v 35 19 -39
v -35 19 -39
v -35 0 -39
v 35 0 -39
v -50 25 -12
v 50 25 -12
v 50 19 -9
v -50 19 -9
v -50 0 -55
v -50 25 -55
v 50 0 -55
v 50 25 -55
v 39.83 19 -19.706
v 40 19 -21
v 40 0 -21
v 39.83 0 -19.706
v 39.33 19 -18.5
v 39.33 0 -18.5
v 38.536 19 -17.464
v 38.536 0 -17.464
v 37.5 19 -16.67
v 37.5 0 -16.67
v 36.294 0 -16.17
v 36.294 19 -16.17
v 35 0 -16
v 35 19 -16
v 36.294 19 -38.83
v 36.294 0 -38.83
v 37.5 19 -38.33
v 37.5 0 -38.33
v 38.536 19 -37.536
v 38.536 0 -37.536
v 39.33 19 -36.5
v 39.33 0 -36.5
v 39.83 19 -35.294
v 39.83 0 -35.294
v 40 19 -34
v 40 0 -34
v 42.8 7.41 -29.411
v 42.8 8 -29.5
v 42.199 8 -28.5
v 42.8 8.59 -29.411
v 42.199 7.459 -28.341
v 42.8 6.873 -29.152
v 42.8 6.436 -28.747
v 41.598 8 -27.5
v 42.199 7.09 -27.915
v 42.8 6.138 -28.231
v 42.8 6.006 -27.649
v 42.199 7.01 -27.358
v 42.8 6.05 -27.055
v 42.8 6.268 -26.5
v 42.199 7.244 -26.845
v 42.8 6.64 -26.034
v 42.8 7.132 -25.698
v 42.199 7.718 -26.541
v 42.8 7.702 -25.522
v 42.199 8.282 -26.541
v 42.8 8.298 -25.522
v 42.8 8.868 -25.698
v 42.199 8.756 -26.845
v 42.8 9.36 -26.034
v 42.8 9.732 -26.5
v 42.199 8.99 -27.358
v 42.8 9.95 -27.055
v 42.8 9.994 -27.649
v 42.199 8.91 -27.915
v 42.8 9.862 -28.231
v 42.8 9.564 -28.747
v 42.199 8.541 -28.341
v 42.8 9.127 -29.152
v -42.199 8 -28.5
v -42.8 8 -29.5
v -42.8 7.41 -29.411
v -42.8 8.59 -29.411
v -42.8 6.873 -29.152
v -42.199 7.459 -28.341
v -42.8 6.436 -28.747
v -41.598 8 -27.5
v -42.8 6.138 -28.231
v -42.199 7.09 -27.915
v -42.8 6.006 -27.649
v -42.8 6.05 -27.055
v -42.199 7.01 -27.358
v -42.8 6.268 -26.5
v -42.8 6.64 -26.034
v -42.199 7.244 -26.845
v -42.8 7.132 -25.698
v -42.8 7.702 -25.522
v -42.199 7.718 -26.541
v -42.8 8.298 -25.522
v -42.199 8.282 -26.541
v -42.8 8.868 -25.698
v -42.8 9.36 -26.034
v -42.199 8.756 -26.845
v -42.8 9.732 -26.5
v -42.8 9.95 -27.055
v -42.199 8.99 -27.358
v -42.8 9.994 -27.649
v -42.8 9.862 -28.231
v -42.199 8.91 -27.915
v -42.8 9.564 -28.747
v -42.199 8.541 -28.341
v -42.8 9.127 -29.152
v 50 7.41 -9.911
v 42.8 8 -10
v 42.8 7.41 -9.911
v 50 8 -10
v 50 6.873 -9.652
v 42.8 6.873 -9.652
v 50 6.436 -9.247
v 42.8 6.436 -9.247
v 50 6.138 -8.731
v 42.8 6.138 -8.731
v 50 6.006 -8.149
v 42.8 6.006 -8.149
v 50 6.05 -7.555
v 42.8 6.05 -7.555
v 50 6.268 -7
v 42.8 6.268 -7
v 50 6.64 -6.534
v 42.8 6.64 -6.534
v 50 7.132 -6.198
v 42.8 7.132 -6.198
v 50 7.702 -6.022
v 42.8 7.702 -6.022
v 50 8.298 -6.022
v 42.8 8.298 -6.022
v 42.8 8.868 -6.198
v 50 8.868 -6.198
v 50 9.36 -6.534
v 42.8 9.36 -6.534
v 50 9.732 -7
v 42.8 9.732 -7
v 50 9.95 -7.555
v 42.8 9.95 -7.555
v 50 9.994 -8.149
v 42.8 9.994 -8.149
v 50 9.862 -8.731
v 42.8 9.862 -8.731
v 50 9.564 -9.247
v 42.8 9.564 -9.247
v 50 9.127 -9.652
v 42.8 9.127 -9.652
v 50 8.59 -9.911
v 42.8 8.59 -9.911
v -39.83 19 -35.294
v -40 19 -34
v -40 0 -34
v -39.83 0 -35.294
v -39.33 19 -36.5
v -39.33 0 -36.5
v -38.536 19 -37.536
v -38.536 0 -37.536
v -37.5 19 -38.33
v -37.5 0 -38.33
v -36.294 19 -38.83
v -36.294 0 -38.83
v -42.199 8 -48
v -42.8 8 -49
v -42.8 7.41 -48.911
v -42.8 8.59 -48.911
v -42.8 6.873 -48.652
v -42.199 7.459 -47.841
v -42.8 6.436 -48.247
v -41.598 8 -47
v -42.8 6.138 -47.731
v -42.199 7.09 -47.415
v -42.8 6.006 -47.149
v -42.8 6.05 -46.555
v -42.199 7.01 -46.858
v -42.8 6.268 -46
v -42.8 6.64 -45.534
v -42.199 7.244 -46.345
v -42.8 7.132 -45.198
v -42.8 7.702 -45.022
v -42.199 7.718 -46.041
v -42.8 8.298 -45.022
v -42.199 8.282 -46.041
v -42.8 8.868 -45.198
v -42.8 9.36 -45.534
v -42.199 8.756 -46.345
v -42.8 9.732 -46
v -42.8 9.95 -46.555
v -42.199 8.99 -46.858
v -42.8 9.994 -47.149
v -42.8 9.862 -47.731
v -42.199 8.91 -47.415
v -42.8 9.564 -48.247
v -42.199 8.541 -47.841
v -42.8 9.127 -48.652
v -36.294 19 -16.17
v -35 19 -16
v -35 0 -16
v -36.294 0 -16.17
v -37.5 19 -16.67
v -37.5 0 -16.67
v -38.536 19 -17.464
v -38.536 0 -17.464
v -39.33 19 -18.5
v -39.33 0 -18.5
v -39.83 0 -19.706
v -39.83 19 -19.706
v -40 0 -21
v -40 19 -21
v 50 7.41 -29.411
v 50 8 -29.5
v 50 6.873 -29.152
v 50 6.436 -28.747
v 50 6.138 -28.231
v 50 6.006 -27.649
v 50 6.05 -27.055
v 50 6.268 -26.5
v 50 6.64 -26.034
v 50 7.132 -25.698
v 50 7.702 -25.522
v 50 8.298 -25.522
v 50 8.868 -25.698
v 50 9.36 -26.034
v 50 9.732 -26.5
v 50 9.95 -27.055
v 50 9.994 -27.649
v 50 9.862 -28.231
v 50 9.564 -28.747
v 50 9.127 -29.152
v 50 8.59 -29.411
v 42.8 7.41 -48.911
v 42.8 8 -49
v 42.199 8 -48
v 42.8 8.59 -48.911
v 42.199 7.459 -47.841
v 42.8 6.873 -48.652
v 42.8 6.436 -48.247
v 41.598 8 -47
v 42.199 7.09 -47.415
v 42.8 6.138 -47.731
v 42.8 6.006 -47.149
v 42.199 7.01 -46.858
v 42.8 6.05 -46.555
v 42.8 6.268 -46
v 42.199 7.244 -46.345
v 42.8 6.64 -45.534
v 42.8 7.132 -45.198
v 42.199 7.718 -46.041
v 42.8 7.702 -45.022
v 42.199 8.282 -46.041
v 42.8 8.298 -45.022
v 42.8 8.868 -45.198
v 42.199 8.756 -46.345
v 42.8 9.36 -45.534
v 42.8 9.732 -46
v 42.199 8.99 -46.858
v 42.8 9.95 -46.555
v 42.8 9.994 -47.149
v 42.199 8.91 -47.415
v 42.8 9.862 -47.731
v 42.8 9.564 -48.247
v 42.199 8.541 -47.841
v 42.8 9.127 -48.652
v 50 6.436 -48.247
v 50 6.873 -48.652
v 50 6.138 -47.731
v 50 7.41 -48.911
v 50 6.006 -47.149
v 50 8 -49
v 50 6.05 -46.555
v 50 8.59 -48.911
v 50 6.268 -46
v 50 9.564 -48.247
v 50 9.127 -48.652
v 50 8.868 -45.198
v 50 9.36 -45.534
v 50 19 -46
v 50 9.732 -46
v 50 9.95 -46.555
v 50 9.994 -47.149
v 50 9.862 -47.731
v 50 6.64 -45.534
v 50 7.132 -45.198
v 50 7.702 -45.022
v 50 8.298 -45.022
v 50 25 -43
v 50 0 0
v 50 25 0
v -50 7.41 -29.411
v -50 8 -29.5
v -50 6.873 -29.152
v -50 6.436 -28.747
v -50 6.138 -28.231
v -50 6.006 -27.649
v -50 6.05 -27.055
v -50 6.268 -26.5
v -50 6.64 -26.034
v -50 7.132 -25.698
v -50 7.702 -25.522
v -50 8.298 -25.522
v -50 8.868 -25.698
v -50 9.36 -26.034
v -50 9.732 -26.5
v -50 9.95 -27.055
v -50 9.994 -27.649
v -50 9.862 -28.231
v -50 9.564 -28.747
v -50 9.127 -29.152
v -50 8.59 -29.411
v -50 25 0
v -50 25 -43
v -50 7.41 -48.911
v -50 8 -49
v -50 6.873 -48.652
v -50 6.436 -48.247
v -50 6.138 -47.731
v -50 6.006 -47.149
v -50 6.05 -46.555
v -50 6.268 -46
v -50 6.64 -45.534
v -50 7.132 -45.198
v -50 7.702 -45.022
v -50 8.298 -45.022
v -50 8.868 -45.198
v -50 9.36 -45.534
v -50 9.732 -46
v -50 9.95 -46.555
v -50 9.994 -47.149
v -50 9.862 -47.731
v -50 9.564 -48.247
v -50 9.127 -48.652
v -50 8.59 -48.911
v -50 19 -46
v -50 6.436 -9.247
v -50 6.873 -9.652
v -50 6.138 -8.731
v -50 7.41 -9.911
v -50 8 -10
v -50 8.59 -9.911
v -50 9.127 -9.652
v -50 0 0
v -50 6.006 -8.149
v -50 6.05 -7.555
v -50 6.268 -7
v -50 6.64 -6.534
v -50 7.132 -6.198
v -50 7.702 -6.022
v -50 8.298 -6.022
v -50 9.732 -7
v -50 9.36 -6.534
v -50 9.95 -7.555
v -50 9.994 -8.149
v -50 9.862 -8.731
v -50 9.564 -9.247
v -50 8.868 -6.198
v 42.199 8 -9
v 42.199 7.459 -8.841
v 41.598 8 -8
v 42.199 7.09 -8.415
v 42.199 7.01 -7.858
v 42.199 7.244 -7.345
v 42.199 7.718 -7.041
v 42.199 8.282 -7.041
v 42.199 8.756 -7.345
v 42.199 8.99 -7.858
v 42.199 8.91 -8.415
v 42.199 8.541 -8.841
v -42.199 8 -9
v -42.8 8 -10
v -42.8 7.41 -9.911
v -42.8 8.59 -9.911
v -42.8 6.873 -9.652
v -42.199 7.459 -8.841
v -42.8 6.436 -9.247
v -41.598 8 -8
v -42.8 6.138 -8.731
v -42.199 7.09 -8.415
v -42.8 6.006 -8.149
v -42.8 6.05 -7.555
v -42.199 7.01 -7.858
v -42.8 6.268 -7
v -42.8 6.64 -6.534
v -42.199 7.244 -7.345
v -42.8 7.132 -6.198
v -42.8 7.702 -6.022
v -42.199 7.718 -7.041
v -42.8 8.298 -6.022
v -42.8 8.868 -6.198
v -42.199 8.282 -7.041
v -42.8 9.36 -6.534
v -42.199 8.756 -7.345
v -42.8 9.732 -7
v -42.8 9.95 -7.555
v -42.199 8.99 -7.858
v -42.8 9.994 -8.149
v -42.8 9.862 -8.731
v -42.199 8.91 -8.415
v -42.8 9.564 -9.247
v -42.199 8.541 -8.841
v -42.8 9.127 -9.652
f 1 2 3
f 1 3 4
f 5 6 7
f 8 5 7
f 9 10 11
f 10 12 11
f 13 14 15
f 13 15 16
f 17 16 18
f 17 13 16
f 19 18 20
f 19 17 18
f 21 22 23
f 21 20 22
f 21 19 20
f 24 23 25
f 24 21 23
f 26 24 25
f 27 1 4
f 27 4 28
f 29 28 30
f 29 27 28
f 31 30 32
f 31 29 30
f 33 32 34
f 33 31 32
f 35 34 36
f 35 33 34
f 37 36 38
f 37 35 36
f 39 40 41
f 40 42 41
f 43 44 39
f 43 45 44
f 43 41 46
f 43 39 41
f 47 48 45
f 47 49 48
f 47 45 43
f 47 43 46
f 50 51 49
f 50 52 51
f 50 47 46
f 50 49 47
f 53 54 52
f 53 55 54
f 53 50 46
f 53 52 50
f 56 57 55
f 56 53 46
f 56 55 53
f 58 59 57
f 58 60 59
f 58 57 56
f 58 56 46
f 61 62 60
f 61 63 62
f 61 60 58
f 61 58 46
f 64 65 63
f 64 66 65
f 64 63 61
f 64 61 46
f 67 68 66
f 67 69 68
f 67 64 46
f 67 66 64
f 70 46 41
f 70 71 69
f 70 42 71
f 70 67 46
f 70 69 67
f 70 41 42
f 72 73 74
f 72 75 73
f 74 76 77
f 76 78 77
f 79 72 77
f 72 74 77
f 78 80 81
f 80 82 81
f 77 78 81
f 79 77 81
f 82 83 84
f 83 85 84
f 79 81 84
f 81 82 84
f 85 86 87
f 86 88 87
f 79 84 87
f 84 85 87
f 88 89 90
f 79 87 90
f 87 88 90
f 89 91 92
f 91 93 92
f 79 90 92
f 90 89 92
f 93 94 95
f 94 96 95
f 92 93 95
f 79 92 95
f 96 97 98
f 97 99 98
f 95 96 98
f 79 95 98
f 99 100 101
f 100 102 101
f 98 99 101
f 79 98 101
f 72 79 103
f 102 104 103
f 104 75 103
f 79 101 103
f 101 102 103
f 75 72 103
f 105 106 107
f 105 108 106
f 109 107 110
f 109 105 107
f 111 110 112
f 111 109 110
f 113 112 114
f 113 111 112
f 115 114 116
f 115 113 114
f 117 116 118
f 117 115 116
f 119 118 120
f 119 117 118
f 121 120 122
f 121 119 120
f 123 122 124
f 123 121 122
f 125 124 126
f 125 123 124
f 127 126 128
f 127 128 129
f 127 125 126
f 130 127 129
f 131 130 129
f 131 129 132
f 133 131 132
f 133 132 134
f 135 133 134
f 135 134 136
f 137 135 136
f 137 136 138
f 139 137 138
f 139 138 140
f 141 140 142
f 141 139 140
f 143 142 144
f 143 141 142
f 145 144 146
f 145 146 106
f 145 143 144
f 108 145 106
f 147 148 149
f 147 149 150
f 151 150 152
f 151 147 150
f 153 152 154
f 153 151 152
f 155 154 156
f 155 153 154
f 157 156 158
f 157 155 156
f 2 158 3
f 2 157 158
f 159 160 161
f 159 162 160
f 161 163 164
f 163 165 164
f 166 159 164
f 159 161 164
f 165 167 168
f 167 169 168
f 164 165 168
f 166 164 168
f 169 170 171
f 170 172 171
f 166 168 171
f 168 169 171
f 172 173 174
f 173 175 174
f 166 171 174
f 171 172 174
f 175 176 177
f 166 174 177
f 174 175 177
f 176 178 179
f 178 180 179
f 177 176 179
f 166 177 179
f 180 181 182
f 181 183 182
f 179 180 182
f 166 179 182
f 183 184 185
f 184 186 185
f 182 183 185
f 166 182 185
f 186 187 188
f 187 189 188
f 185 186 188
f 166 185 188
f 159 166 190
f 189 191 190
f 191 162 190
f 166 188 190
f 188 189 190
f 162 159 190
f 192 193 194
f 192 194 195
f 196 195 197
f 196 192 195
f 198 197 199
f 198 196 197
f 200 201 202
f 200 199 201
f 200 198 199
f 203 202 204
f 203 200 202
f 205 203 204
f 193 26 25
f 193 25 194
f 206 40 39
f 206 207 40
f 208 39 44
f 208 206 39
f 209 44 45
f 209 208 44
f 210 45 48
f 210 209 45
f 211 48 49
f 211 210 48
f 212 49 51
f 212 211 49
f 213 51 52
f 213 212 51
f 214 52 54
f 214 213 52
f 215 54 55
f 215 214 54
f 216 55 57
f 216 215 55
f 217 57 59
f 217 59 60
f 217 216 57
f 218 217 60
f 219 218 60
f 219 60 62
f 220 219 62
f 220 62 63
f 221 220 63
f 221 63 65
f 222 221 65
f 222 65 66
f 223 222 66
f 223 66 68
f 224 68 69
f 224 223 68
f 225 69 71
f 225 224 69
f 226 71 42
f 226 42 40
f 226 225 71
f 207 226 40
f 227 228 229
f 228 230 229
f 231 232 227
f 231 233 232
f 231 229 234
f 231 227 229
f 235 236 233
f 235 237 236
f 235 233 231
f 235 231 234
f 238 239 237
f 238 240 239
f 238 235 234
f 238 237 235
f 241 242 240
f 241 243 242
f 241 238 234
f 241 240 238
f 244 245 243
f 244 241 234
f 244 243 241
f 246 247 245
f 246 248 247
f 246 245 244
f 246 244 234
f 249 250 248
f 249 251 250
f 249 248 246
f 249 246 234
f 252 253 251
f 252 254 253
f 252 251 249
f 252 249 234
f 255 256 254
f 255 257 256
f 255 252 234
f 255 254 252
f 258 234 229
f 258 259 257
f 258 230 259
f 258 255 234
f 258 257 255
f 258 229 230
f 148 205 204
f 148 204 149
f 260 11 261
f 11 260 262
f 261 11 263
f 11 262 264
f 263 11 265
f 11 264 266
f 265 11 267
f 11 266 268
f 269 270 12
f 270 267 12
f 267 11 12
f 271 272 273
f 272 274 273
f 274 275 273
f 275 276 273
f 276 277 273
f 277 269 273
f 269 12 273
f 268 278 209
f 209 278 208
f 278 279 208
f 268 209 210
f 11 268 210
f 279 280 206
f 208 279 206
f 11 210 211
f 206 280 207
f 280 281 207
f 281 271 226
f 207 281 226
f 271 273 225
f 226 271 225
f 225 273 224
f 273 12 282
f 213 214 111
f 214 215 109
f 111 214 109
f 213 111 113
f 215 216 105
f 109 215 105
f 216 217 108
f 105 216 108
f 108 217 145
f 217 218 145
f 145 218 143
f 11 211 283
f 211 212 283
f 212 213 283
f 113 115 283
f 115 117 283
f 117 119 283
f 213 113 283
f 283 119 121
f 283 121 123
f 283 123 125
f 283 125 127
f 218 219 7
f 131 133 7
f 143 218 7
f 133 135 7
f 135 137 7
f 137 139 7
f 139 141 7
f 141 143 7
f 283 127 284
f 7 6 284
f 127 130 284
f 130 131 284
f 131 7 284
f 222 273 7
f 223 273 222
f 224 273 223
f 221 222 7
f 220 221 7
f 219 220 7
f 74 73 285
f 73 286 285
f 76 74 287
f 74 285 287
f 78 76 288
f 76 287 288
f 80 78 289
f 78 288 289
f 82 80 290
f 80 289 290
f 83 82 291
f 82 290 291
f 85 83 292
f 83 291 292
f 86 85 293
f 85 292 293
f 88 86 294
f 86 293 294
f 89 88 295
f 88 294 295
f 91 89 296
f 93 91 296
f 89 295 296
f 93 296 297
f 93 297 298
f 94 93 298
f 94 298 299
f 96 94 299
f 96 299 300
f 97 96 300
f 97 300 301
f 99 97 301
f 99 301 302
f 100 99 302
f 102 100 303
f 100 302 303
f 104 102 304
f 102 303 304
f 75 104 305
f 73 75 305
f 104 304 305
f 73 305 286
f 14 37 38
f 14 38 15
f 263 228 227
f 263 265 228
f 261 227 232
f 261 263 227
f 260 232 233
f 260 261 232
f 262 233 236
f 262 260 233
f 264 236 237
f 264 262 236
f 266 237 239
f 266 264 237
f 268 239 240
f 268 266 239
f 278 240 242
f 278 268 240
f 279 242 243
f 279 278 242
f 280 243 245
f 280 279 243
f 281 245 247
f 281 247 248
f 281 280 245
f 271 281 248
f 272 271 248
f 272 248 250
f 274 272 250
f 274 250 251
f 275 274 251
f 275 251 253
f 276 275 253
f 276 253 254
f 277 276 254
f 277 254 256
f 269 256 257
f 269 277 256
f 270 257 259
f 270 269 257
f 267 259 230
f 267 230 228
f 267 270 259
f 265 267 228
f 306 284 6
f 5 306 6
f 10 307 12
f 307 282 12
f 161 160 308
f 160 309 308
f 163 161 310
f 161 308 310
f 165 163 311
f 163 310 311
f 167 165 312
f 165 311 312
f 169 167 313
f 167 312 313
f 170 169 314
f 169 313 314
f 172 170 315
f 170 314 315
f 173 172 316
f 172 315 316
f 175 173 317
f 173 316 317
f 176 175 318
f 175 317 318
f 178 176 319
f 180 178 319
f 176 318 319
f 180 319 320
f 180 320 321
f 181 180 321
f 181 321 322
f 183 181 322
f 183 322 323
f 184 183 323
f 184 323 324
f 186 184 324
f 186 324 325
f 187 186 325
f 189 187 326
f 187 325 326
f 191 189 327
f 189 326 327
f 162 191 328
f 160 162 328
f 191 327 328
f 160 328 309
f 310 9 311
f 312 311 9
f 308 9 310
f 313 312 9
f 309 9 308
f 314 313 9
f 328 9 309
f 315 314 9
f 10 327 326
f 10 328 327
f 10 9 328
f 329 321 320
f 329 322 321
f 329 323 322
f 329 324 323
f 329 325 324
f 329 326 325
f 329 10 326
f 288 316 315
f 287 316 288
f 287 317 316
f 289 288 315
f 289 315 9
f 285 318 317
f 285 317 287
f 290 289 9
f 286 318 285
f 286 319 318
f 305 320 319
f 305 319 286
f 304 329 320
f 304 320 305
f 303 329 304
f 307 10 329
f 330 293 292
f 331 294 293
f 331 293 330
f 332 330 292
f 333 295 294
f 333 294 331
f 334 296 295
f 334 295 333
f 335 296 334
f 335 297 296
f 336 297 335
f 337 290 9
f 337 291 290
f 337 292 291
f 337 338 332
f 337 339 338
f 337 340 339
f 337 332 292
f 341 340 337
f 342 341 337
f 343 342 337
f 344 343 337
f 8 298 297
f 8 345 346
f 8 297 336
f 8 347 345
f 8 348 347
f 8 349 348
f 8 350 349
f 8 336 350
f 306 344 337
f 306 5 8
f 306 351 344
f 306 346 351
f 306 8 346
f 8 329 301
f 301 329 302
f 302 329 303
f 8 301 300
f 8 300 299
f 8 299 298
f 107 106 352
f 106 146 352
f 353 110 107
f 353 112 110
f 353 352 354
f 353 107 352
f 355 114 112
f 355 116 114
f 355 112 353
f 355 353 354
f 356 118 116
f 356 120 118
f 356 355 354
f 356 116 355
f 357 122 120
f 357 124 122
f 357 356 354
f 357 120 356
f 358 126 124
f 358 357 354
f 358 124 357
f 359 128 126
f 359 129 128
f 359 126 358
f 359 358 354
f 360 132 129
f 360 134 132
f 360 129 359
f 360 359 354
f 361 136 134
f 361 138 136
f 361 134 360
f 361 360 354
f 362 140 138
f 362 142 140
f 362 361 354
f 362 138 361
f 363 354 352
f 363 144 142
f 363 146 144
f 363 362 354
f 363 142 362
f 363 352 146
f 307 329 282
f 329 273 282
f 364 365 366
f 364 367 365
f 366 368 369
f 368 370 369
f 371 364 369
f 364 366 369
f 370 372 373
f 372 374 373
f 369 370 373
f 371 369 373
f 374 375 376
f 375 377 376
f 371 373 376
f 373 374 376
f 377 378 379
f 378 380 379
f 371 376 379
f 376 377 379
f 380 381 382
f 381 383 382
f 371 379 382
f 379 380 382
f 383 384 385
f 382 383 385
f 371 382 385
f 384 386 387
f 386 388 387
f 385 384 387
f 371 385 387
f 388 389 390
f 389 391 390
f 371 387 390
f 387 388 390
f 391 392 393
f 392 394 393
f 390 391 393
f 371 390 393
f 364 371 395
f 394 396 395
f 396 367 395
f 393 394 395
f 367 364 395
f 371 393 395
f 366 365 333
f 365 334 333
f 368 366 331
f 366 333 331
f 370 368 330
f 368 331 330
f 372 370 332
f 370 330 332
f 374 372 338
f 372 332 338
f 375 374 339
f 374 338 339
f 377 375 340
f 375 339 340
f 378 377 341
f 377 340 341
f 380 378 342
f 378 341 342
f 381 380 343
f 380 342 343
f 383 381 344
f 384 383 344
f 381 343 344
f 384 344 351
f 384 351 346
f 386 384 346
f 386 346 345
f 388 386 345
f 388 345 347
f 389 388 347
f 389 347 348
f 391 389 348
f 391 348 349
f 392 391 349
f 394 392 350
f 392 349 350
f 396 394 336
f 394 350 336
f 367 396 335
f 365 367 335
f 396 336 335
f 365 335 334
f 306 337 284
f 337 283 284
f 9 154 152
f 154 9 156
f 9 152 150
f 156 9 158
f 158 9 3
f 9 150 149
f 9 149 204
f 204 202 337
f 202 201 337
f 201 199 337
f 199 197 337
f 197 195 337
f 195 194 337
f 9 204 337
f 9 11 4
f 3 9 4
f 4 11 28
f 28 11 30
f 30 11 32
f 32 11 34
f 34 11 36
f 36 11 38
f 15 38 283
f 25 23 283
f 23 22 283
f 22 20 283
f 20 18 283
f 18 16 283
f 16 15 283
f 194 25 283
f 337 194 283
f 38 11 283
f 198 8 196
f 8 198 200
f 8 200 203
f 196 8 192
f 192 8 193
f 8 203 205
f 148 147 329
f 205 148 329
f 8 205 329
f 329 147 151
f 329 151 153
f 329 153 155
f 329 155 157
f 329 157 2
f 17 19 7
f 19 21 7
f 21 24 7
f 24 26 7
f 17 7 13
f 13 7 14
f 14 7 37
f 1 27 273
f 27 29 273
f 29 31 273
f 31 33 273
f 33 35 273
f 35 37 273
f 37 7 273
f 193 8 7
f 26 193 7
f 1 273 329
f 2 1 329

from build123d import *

# Parameters (mm, degrees)
BOSS_EXTRUDE1_DEPTH                  = 50
TAP_DRILL_FOR_M5X0_8_TAP1_AT_2_COUNT = 2
TAP_DRILL_FOR_M5X0_8_TAP1_AT_2_PITCH = 19.5
TAP_DRILL_FOR_M5X0_8_TAP1_AT_3_COUNT = 2
TAP_DRILL_FOR_M5X0_8_TAP1_AT_3_PITCH = 39
CUT_EXTRUDE1_DEPTH                   = 20


with BuildPart() as part:
    # Sketch1 → Boss-Extrude1 (new body, symmetric)
    with BuildSketch(Plane(origin=(0, 0, 0), x_dir=(0, 0, -1), z_dir=(1, 0, 0))):
        Polygon((9, 19), (46, 19), (43, 25), (55, 25), (55, 0), (0, 0), (0, 25), (12, 25), align=None)
    extrude(amount=BOSS_EXTRUDE1_DEPTH, both=True)

    # Sketch5 → Tap Drill for M5x0.8 Tap1 (revolve, cut)
    with BuildSketch(Plane(origin=(50, 8, -8), x_dir=(0, 0, -1), z_dir=(0, 1, 0))):
        Polygon((0, 0), (0, 8.401721238), (2, 7.2), (2, 0), align=None)
    tap_drill_for_m5x0_8_tap1 = revolve(axis=Axis((56.35, 8, -8), (-1, 0, 0)), mode=Mode.SUBTRACT)

    # Tap Drill for M5x0.8 Tap1 at 2: Tap Drill for M5x0.8 Tap1 ×2
    with Locations(*[(0, 0, -i * TAP_DRILL_FOR_M5X0_8_TAP1_AT_2_PITCH) for i in range(1, TAP_DRILL_FOR_M5X0_8_TAP1_AT_2_COUNT)]):
        add(tap_drill_for_m5x0_8_tap1, mode=Mode.SUBTRACT)

    # Tap Drill for M5x0.8 Tap1 at 3: Tap Drill for M5x0.8 Tap1 ×2
    with Locations(*[(0, 0, -i * TAP_DRILL_FOR_M5X0_8_TAP1_AT_3_PITCH) for i in range(1, TAP_DRILL_FOR_M5X0_8_TAP1_AT_3_COUNT)]):
        add(tap_drill_for_m5x0_8_tap1, mode=Mode.SUBTRACT)

    # Mirror2: Tap Drill for M5x0.8 Tap1 across plane
    add(tap_drill_for_m5x0_8_tap1.mirror(Plane(origin=(0, 0, 0), x_dir=(0, 0, 1), z_dir=(1, 0, 0))), mode=Mode.SUBTRACT)

    # Mirror2 copy 1 sketch → Mirror2 copy 1 (revolve, cut)
    with BuildSketch(Plane(origin=(-50, 8, -27.5), x_dir=(0, 0, -1), z_dir=(0, 1, 0))):
        Polygon((0, 0), (0, -8.401721238), (2, -7.2), (2, 0), align=None)
    revolve(axis=Axis((-56.35, 8, -27.5), (-1, 0, 0)), mode=Mode.SUBTRACT)

    # Mirror2 copy 2 sketch → Mirror2 copy 2 (revolve, cut)
    with BuildSketch(Plane(origin=(-50, 8, -47), x_dir=(0, 0, -1), z_dir=(0, 1, 0))):
        Polygon((0, 0), (0, -8.401721238), (2, -7.2), (2, 0), align=None)
    revolve(axis=Axis((-56.35, 8, -47), (-1, 0, 0)), mode=Mode.SUBTRACT)

    # Sketch6 → Cut-Extrude1 (cut, through all)
    with BuildSketch(Plane(origin=(0, 19, 0), x_dir=(1, 0, 0), z_dir=(0, 1, 0))):
        with BuildLine():
            Line((-35, 39), (35, 39))
            ThreePointArc((35, 39), (38.535533906, 37.535533906), (40, 34))
            Line((40, 34), (40, 21))
            ThreePointArc((40, 21), (38.535533906, 17.464466094), (35, 16))
            Line((35, 16), (-35, 16))
            ThreePointArc((-35, 16), (-38.535533906, 17.464466094), (-40, 21))
            Line((-40, 21), (-40, 34))
            ThreePointArc((-40, 34), (-38.535533906, 37.535533906), (-35, 39))
        make_face()
    extrude(amount=-CUT_EXTRUDE1_DEPTH, mode=Mode.SUBTRACT)


solid = part.part
